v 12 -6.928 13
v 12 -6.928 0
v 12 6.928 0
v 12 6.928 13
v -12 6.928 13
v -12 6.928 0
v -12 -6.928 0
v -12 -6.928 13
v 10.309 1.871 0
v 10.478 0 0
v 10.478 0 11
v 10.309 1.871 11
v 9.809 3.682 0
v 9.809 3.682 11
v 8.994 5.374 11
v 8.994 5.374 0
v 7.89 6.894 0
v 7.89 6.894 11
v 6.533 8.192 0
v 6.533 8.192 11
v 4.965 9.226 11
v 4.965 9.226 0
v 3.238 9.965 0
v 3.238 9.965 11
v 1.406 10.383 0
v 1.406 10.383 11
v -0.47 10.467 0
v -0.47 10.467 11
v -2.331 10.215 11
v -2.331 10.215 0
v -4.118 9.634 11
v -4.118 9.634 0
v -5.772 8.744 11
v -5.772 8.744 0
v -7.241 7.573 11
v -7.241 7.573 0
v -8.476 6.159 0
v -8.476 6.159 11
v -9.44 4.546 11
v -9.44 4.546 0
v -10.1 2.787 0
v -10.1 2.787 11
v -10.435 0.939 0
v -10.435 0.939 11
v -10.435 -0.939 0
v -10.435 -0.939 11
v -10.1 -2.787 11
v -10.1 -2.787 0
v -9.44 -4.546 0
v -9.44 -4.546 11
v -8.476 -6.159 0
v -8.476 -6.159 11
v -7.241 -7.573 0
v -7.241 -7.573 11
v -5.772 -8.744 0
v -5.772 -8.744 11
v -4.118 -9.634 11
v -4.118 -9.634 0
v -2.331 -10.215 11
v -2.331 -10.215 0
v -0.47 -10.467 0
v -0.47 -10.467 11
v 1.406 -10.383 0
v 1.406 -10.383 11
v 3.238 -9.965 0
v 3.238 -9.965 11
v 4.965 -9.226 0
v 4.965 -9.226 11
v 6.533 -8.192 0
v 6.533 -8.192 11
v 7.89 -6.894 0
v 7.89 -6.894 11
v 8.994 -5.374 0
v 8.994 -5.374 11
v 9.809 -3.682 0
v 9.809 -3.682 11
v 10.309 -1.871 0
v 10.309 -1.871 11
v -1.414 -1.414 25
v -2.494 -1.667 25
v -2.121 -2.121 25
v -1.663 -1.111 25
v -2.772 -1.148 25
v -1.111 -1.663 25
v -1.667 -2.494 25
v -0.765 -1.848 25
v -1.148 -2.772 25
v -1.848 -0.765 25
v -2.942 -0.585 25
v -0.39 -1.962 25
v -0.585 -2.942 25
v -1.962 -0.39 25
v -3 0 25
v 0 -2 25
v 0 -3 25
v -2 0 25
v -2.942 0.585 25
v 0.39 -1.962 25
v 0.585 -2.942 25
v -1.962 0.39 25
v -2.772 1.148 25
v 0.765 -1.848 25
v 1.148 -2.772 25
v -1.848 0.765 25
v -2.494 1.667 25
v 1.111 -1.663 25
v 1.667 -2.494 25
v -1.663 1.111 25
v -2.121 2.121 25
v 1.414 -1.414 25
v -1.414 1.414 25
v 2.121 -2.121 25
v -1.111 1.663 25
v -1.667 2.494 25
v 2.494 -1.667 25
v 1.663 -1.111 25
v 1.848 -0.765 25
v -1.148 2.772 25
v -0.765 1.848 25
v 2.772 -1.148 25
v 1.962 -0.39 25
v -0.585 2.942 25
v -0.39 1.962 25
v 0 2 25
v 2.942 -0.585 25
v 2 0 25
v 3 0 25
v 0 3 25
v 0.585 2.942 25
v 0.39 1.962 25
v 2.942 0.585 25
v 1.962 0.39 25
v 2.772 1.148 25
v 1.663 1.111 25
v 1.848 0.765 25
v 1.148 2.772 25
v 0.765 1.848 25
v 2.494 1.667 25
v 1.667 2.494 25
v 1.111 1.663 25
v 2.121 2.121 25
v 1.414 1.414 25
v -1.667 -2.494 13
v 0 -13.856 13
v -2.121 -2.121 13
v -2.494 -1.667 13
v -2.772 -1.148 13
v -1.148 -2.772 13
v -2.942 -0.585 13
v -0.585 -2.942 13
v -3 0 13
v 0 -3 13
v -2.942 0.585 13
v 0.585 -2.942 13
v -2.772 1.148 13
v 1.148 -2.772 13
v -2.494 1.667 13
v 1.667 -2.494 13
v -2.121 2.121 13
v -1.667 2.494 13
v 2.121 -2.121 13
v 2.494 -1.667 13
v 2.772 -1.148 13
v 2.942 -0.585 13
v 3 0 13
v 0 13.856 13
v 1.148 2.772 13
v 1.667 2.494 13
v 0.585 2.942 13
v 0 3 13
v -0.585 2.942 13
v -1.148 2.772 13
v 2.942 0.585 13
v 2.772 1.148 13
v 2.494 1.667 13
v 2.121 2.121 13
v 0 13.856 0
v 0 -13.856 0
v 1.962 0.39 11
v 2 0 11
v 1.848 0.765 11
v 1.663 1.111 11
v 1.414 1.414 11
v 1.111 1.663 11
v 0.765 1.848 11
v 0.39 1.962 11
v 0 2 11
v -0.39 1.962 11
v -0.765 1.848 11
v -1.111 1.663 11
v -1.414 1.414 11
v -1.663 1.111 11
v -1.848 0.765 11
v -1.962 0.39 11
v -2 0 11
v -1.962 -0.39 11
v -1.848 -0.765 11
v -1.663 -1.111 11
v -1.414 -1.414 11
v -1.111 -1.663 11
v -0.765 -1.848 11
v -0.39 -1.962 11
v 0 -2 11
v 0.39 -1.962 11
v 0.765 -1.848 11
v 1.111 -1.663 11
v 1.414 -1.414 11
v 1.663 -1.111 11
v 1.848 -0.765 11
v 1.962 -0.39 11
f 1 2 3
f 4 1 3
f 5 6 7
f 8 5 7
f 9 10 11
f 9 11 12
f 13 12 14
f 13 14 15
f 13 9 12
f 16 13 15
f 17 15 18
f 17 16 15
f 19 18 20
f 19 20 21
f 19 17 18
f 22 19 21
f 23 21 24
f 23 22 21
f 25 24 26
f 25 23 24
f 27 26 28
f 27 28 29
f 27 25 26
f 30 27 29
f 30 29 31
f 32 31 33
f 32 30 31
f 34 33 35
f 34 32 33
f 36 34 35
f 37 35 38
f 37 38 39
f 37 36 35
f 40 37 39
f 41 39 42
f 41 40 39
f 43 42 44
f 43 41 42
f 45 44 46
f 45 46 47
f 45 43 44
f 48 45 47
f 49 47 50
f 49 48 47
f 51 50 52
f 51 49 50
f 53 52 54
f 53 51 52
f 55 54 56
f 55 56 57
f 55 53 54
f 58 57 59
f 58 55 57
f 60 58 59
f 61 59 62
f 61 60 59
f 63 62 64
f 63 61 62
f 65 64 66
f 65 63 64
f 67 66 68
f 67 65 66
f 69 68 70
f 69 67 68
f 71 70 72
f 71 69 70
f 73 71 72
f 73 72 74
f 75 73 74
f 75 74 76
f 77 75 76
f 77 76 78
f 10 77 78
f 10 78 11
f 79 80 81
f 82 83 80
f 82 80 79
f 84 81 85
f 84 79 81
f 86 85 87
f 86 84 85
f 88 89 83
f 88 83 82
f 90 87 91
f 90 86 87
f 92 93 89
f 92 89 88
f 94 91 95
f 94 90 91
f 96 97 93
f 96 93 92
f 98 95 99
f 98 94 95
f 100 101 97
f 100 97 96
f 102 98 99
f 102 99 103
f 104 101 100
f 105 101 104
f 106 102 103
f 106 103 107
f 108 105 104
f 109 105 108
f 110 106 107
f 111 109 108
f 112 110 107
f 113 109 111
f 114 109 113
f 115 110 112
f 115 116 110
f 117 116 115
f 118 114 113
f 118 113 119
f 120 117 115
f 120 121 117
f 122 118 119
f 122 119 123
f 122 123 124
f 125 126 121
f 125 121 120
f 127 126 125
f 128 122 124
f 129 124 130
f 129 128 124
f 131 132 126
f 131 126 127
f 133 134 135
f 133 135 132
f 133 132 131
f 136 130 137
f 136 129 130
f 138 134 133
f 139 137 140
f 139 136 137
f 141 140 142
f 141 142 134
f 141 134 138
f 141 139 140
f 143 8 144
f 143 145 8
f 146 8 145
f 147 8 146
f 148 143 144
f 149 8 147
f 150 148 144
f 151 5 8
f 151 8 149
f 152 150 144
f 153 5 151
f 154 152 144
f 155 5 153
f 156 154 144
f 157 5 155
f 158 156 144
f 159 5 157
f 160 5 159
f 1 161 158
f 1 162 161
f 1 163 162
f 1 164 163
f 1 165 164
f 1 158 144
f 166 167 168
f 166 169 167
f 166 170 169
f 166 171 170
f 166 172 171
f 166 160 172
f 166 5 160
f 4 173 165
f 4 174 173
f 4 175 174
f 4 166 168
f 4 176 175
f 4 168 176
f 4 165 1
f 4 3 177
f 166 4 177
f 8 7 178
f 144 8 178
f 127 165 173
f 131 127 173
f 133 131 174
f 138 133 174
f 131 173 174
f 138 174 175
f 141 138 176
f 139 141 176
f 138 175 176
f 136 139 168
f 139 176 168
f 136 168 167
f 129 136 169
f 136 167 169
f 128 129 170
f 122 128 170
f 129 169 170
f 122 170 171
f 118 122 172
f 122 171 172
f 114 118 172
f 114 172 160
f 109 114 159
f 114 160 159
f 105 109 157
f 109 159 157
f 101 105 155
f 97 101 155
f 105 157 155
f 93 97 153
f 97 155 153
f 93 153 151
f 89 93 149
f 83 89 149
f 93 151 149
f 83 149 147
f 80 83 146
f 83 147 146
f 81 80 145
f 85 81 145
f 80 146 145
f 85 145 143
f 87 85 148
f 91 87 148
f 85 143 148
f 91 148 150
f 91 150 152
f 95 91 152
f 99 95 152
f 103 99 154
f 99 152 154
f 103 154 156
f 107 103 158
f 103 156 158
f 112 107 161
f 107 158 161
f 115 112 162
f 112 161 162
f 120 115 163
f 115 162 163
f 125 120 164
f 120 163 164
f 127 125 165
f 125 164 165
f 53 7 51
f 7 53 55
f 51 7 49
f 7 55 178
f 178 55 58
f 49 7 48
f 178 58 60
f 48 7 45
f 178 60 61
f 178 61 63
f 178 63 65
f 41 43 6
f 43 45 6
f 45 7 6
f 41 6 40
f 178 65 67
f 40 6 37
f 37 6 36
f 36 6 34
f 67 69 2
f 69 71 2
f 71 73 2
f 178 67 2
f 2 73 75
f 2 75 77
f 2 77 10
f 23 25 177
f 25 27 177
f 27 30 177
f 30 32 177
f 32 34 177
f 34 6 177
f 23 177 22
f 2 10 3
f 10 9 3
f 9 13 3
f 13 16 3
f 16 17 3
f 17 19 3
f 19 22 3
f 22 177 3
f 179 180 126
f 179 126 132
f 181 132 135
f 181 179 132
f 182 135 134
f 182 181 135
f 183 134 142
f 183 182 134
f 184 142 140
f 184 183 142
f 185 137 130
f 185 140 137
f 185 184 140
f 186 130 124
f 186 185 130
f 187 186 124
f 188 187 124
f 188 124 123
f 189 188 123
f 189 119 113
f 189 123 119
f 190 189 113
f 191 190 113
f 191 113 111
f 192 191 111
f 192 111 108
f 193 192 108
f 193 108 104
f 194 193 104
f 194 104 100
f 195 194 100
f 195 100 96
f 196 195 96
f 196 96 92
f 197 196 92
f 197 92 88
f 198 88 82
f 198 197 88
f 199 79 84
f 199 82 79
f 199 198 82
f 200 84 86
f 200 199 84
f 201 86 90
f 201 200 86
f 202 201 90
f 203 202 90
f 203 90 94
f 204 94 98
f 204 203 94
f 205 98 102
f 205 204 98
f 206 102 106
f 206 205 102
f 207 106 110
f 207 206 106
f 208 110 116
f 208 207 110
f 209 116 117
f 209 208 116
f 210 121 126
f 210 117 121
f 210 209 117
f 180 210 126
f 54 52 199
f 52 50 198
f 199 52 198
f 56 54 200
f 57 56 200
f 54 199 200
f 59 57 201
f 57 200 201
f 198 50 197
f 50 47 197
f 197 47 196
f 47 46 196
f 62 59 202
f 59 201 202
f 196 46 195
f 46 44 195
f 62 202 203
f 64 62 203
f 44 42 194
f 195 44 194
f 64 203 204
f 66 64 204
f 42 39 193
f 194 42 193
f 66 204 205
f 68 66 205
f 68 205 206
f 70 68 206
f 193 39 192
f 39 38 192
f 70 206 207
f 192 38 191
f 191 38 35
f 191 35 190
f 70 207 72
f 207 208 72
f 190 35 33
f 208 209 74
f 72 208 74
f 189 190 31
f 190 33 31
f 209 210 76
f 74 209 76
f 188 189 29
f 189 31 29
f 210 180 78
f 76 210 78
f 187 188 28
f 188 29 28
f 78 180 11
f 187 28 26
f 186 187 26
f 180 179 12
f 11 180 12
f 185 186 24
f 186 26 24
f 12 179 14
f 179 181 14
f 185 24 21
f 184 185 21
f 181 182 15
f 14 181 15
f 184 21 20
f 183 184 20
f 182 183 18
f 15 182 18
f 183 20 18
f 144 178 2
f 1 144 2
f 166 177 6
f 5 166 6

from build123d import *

# Parameters (mm, degrees)
HEX_NUT_DEPTH     = 13
SKETCH2_R         = 10.4775
THREAD_BORE_DEPTH = 11
BARB_START        = 13
SKETCH3_R         = 3
BARB_DEPTH        = 12
SKETCH4_R         = 2
BORE_DEPTH        = 32


with BuildPart() as part:
    # Sketch1 → Hex_Nut (new body)
    with BuildSketch(Plane.XY):
        Polygon((12, 6.92820323), (0, 13.856406461), (-12, 6.92820323), (-12, -6.92820323), (0, -13.856406461), (12, -6.92820323), align=None)
    extrude(amount=HEX_NUT_DEPTH)

    # Sketch2 → Thread_Bore (cut)
    with BuildSketch(Plane.XY):
        Circle(SKETCH2_R)
    extrude(amount=THREAD_BORE_DEPTH, mode=Mode.SUBTRACT)

    # Sketch3 → Barb (add)
    with BuildSketch(Plane.XY.offset(BARB_START)):
        Circle(SKETCH3_R)
    extrude(amount=BARB_DEPTH)

    # Sketch4 → Bore (cut, through all)
    with BuildSketch(Plane.XY):
        Circle(SKETCH4_R)
    extrude(amount=BORE_DEPTH, mode=Mode.SUBTRACT)


solid = part.part
